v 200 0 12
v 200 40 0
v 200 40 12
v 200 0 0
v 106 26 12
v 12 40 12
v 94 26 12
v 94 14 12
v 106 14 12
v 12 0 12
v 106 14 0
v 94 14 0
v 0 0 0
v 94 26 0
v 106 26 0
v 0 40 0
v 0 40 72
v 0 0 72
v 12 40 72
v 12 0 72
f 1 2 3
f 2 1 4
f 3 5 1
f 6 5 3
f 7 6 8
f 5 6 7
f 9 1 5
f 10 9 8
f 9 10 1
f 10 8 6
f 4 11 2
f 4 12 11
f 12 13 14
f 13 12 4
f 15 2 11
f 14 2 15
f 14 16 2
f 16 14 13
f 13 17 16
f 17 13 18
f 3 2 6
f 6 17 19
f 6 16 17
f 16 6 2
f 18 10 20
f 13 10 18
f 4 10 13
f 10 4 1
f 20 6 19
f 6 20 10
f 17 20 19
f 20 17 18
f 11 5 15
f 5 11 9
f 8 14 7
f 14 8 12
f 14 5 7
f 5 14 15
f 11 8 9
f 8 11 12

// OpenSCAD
$fn = 32;

// ----------------------------------------------------------------------
// Gantry bracket: 200-250 mm L bracket
// ----------------------------------------------------------------------

// --- parameters (mm) ---
base_l = 200;             // base arm length, X
arm_w = 40;               // arm width, Y
thick = 12;               // arm thickness
up_h = 60;                // vertical arm height, Z
slot_w = 12;              // adjustment slot width in the base

total_h = up_h + thick;  // overall height

difference() {
  union() {
    cube([base_l, arm_w, thick]);
    cube([thick, arm_w, total_h]);
  }
  translate([base_l / 2 - slot_w / 2, arm_w / 2 - slot_w / 2, -1])
    cube([slot_w, slot_w, thick + 2]);
}
